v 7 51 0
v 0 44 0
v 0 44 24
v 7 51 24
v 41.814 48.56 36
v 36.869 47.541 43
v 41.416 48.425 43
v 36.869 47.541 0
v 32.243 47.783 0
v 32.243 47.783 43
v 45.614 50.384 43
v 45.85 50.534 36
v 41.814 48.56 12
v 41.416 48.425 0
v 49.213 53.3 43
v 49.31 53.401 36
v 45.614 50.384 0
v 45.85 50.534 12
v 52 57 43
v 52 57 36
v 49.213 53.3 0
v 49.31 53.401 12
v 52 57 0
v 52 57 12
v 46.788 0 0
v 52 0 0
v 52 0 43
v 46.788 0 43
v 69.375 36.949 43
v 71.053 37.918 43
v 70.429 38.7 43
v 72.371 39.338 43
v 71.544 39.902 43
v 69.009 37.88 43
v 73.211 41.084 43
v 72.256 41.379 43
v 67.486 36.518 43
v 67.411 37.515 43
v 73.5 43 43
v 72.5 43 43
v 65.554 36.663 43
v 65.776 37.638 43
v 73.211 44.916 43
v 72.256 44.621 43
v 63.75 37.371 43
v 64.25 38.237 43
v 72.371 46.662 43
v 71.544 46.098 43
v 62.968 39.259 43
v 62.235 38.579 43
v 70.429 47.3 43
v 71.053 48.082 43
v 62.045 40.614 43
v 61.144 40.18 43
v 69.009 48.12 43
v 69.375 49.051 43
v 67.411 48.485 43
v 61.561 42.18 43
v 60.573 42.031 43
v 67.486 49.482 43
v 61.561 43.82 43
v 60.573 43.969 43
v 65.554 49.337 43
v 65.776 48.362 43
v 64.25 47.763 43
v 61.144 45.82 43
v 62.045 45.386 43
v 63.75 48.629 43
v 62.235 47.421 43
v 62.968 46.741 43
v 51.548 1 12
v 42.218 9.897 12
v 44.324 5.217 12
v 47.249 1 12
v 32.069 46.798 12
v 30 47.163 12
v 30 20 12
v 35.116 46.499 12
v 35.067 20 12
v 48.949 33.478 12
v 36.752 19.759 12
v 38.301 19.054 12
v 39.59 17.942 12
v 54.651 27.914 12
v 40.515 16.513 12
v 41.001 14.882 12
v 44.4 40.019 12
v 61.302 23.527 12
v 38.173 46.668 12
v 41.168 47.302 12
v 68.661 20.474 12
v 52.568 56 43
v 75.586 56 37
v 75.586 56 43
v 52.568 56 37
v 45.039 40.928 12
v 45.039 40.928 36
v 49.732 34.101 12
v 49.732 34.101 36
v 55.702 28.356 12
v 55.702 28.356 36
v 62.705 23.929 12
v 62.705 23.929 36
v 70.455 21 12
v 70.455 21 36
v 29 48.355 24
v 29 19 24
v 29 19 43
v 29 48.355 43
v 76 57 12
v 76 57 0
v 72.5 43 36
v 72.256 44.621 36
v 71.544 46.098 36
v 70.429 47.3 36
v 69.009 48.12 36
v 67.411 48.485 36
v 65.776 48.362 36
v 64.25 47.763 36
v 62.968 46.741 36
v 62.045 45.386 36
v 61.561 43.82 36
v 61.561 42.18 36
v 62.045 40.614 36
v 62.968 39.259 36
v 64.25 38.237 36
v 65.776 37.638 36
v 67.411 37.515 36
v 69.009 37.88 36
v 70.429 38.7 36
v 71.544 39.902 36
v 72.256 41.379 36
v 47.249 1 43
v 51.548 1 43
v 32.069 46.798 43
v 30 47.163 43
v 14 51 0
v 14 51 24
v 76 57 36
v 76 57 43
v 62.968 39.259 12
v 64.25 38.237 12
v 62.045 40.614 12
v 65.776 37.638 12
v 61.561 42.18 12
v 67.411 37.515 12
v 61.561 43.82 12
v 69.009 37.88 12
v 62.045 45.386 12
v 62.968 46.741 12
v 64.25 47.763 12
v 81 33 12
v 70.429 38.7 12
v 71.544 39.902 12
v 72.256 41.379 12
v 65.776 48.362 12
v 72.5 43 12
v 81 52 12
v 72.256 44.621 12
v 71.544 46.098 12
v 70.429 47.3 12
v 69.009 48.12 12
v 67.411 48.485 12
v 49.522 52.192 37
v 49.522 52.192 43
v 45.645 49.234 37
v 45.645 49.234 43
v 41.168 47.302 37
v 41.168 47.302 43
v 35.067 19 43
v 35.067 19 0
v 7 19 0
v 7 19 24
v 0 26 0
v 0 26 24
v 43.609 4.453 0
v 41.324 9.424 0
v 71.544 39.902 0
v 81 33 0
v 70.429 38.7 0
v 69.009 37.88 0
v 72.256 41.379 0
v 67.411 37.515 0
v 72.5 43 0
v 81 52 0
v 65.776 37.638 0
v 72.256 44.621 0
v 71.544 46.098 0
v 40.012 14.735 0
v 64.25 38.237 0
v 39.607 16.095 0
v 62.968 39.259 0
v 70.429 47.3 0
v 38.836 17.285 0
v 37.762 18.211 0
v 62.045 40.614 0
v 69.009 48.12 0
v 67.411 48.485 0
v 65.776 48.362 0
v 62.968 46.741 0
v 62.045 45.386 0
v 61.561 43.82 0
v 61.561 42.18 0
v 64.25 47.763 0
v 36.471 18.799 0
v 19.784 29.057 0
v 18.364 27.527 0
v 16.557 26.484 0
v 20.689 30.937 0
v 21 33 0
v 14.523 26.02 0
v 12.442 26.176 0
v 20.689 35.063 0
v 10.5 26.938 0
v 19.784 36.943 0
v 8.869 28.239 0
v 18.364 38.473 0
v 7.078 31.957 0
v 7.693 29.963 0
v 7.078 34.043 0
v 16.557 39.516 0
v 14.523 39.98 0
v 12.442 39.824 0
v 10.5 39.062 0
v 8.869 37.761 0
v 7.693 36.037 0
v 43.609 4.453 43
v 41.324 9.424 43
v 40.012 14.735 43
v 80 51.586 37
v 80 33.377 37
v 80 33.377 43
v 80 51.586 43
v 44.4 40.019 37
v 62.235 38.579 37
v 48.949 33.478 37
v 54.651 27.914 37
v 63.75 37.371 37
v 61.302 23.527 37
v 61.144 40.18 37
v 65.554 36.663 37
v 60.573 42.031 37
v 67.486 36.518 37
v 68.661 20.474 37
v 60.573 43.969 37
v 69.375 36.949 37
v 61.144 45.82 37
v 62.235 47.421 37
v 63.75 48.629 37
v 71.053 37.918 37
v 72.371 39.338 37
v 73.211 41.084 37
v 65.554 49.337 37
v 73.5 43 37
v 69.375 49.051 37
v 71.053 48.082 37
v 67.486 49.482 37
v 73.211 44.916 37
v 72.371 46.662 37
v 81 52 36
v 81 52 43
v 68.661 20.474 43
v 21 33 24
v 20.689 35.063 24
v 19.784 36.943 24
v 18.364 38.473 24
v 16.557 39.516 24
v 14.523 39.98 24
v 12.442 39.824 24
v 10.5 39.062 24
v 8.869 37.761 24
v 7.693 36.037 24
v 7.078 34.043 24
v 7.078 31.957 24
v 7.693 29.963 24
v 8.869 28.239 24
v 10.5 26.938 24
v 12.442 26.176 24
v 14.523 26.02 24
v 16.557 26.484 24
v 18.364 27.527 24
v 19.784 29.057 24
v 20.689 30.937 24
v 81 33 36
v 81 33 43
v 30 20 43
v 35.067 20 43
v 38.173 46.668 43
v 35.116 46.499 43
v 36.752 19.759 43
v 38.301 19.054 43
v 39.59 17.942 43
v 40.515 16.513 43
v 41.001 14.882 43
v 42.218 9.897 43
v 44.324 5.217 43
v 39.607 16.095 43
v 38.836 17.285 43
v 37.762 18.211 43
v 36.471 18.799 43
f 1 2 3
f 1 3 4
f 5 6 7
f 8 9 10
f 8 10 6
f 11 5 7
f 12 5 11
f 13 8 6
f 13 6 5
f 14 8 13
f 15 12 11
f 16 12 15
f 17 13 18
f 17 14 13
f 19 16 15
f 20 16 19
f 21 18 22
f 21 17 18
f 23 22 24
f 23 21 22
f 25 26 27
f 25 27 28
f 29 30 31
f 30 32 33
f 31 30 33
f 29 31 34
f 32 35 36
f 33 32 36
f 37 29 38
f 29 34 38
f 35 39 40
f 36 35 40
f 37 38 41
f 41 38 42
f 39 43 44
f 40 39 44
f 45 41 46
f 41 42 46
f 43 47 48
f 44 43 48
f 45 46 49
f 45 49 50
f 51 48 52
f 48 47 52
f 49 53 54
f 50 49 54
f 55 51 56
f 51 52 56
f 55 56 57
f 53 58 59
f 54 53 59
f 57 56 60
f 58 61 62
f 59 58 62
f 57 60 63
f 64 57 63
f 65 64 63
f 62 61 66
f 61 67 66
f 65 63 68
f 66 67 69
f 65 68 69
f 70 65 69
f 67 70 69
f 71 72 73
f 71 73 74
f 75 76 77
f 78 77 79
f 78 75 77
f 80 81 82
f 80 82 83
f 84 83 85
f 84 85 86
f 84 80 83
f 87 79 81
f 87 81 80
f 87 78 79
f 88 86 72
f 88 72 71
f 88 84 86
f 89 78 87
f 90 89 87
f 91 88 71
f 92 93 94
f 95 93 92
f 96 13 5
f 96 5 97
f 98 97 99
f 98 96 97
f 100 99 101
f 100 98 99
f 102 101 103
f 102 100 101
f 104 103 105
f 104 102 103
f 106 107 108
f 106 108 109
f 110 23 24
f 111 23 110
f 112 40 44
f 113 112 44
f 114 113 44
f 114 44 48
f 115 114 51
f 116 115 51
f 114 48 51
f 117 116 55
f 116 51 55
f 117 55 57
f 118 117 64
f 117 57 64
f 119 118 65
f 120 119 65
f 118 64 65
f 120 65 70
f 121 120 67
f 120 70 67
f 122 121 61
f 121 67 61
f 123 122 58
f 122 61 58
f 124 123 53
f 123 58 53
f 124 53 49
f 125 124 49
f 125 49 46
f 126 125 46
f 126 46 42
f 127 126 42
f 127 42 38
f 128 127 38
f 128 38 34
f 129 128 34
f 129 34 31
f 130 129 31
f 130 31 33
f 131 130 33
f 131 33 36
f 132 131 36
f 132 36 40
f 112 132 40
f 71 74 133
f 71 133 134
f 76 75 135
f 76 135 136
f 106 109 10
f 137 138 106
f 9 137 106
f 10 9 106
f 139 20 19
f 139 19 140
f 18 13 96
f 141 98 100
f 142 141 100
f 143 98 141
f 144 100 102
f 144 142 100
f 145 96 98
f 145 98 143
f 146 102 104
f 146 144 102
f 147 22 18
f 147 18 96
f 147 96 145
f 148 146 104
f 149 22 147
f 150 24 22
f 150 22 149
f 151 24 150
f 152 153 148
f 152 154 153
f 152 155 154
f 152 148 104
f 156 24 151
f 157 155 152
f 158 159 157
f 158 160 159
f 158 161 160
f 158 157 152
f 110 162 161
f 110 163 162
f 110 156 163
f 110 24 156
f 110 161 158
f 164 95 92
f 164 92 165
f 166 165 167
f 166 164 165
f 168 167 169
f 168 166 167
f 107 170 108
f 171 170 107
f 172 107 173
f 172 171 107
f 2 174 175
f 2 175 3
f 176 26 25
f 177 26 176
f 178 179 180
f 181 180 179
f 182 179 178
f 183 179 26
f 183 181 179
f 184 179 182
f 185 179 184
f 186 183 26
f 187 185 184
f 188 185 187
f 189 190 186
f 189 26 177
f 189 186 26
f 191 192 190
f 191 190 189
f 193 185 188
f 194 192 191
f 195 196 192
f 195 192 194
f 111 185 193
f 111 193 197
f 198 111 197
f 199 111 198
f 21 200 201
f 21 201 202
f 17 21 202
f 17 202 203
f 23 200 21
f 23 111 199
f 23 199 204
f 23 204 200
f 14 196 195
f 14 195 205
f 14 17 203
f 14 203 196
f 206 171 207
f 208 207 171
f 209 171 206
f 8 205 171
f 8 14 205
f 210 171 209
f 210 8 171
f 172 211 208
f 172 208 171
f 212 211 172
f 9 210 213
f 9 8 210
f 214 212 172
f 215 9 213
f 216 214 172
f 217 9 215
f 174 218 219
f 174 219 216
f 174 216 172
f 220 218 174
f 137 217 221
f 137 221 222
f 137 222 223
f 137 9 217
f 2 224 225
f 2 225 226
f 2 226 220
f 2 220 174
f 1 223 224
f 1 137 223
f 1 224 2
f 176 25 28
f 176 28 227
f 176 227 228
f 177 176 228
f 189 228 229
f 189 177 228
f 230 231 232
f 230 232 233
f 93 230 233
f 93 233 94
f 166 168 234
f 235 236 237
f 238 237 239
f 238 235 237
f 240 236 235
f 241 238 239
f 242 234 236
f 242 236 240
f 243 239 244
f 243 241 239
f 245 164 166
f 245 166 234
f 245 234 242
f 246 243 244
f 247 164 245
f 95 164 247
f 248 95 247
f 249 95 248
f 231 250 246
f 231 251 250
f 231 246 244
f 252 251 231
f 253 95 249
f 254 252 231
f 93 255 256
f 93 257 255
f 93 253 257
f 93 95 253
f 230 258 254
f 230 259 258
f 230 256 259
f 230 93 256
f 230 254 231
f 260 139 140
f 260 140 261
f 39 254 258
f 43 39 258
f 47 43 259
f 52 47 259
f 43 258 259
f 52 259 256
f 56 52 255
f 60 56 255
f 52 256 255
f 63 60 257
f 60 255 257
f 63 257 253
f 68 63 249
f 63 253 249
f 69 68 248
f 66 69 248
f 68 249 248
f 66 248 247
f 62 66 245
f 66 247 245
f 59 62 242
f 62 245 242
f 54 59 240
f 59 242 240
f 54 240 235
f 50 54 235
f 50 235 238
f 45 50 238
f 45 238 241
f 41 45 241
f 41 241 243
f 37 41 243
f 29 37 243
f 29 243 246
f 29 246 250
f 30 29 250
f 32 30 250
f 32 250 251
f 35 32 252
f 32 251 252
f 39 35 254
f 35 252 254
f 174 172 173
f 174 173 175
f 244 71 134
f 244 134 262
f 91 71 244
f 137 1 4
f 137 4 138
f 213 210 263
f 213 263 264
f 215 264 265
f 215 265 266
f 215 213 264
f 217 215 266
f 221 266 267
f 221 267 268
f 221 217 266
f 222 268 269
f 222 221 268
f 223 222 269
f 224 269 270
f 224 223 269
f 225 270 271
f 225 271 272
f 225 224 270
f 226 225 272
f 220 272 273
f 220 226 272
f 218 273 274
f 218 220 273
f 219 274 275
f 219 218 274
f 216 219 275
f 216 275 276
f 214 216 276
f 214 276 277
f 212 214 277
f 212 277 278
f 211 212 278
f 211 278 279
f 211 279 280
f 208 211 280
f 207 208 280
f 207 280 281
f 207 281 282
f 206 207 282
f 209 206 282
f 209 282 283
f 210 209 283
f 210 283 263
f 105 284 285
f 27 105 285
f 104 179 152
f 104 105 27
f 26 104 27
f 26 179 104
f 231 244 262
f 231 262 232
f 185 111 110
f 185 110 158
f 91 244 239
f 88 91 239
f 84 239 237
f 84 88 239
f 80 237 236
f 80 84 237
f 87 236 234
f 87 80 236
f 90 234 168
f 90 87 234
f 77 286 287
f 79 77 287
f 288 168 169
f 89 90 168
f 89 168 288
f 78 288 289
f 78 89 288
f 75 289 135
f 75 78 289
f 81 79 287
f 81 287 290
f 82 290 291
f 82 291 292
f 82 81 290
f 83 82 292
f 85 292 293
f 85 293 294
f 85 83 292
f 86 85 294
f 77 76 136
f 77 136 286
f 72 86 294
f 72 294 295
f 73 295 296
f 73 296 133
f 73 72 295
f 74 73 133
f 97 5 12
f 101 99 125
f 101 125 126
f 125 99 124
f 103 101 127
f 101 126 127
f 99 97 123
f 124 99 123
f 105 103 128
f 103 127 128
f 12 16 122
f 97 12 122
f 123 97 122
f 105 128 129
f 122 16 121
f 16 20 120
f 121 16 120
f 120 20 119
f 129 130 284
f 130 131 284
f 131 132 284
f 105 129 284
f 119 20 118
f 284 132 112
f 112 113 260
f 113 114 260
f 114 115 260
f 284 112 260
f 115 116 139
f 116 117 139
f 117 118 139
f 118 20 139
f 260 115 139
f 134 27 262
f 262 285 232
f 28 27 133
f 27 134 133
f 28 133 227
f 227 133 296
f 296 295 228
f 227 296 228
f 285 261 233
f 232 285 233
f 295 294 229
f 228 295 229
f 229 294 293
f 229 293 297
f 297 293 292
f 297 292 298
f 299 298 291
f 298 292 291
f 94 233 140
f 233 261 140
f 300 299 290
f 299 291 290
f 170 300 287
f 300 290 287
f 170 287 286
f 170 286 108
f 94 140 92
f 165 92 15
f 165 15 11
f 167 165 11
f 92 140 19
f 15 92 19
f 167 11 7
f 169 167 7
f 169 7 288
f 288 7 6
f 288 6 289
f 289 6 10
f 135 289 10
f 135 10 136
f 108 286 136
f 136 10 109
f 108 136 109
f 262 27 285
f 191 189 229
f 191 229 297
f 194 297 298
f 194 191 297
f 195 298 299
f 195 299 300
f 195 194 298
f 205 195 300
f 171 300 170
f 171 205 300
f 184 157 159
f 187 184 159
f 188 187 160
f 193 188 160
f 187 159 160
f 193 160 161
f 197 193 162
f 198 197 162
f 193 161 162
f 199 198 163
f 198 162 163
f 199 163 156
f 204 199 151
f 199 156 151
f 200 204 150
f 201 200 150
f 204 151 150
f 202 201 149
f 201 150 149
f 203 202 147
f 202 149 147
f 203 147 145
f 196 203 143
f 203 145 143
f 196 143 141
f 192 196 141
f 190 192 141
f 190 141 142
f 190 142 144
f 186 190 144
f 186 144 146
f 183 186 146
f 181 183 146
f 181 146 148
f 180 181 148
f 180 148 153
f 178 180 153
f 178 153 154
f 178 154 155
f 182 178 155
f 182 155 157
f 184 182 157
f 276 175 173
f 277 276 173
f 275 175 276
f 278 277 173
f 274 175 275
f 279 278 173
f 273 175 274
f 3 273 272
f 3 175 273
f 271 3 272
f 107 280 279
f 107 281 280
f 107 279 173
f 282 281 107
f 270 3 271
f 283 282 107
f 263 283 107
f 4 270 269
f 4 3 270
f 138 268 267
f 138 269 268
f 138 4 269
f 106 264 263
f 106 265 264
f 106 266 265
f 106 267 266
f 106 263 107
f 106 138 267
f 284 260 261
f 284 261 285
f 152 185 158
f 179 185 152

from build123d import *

# Parameters (mm, degrees)
SKETCH2_R               = 7
BOSS_EXTRUDE1_DEPTH     = 43
SKETCH3_R               = 5.5
CUT_EXTRUDE1_DEPTH      = 108.976849371
CUT_EXTRUDE2_DEPTH      = 108.976849371
CUT_EXTRUDE2_DEPTH_BACK = 19
SKETCH4_R               = 7
CUT_EXTRUDE12_START     = -24
CUT_EXTRUDE12_DEPTH     = 24
SHELL2_START            = 12
SHELL2_DEPTH            = 31
SHELL2_START_2          = 37
SHELL2_2_OUTLINE_R      = 6.5
SHELL2_2_DEPTH          = 6


# Read off the part's stored shape, not the designer's step: Shell2
with BuildPart() as part:
    # Sketch2 → Boss-Extrude1 (new body)
    with BuildSketch(Plane.XY):
        with BuildLine():
            Line((76, 57), (81, 52))
            Line((81, 52), (81, 33))
            Line((81, 33), (52, 0))
            Line((52, 0), (46.788067397, 0))
            ThreePointArc((46.788067397, 0), (42.3490952, 6.884327939), (40.012264997, 14.735294118))
            ThreePointArc((40.012264997, 14.735294118), (38.331862036, 17.786586232), (35.066626255, 19))
            Line((35.066626255, 19), (7, 19))
            Line((7, 19), (0, 26))
            Line((0, 26), (0, 44))
            Line((0, 44), (7, 51))
            Line((7, 51), (14, 51))
            Line((14, 51), (32.243084988, 47.783251905))
            ThreePointArc((32.243084988, 47.783251905), (43.574972961, 49.276069151), (52, 57))
            Line((52, 57), (76, 57))
        make_face()
        with Locations((14, 33)):
            Circle(SKETCH2_R, mode=Mode.SUBTRACT)
    extrude(amount=BOSS_EXTRUDE1_DEPTH)

    # Sketch3 → Cut-Extrude1 (cut, through all)
    with BuildSketch(Plane.XY.offset(43)):
        with Locations((67, 43)):
            Circle(SKETCH3_R)
    extrude(amount=-CUT_EXTRUDE1_DEPTH, mode=Mode.SUBTRACT)

    # Sketch4 → Cut-Extrude2 (cut, two sides: drawn at the far end of the back side and taken through both)
    with BuildSketch(Plane.XY.offset(43).offset(-CUT_EXTRUDE2_DEPTH_BACK)):
        Polygon((29, 19), (29, 48.355095289), (14, 51), (7, 51), (0, 44), (0, 26), (7, 19), align=None)
        with Locations((14, 33)):
            Circle(SKETCH4_R, mode=Mode.SUBTRACT)
    extrude(amount=CUT_EXTRUDE2_DEPTH + CUT_EXTRUDE2_DEPTH_BACK, mode=Mode.SUBTRACT)

    # Sketch7 → Cut-Extrude12 (cut)
    with BuildSketch(Plane.XY.offset(36).offset(CUT_EXTRUDE12_START)):
        with BuildLine():
            ThreePointArc((52, 57), (47.665353397, 51.864697991), (41.814145925, 48.559571819))
            ThreePointArc((41.814145925, 48.559571819), (52.571435773, 31.077146254), (70.454545455, 21))
            Line((70.454545455, 21), (81, 33))
            Line((81, 33), (81, 52))
            Line((81, 52), (76, 57))
            Line((76, 57), (52, 57))
        make_face()
    extrude(amount=CUT_EXTRUDE12_DEPTH, mode=Mode.SUBTRACT)

    # Shell2 outline → Shell2 (cut)
    with BuildSketch(Plane.XY.offset(SHELL2_START)):
        with BuildLine():
            Line((51.547522264, 1), (68.661045623, 20.47400934))
            ThreePointArc((68.661045623, 20.47400934), (51.667497173, 30.560606948), (41.16767498, 47.301989033))
            ThreePointArc((41.16767498, 47.301989033), (36.647615315, 46.525160064), (32.06943681, 46.798444152))
            Line((32.06943681, 46.798444152), (30, 47.163341697))
            Line((30, 47.163341697), (30, 20))
            Line((30, 20), (35.066626255, 20))
            ThreePointArc((35.066626255, 20), (38.984909193, 18.543903479), (41.001392745, 14.882352941))
            ThreePointArc((41.001392745, 14.882352941), (43.163792236, 7.508400948), (47.249359107, 1))
            Line((47.249359107, 1), (51.547522264, 1))
        make_face()
    extrude(amount=SHELL2_DEPTH, mode=Mode.SUBTRACT)

    # Shell2 2 outline → Shell2 2 (cut)
    with BuildSketch(Plane.XY.offset(SHELL2_START_2)):
        with BuildLine():
            Line((68.661045623, 20.47400934), (80, 33.376957423))
            Line((80, 33.376957423), (80, 51.585786438))
            Line((80, 51.585786438), (75.585786438, 56))
            Line((75.585786438, 56), (52.567775172, 56))
            ThreePointArc((52.567775172, 56), (47.674046111, 50.594185021), (41.16767498, 47.301989034))
            ThreePointArc((41.16767498, 47.301989034), (51.667497173, 30.560606948), (68.661045623, 20.47400934))
        make_face()
        with Locations((67, 43)):
            Circle(SHELL2_2_OUTLINE_R, mode=Mode.SUBTRACT)
    extrude(amount=SHELL2_2_DEPTH, mode=Mode.SUBTRACT)


solid = part.part
